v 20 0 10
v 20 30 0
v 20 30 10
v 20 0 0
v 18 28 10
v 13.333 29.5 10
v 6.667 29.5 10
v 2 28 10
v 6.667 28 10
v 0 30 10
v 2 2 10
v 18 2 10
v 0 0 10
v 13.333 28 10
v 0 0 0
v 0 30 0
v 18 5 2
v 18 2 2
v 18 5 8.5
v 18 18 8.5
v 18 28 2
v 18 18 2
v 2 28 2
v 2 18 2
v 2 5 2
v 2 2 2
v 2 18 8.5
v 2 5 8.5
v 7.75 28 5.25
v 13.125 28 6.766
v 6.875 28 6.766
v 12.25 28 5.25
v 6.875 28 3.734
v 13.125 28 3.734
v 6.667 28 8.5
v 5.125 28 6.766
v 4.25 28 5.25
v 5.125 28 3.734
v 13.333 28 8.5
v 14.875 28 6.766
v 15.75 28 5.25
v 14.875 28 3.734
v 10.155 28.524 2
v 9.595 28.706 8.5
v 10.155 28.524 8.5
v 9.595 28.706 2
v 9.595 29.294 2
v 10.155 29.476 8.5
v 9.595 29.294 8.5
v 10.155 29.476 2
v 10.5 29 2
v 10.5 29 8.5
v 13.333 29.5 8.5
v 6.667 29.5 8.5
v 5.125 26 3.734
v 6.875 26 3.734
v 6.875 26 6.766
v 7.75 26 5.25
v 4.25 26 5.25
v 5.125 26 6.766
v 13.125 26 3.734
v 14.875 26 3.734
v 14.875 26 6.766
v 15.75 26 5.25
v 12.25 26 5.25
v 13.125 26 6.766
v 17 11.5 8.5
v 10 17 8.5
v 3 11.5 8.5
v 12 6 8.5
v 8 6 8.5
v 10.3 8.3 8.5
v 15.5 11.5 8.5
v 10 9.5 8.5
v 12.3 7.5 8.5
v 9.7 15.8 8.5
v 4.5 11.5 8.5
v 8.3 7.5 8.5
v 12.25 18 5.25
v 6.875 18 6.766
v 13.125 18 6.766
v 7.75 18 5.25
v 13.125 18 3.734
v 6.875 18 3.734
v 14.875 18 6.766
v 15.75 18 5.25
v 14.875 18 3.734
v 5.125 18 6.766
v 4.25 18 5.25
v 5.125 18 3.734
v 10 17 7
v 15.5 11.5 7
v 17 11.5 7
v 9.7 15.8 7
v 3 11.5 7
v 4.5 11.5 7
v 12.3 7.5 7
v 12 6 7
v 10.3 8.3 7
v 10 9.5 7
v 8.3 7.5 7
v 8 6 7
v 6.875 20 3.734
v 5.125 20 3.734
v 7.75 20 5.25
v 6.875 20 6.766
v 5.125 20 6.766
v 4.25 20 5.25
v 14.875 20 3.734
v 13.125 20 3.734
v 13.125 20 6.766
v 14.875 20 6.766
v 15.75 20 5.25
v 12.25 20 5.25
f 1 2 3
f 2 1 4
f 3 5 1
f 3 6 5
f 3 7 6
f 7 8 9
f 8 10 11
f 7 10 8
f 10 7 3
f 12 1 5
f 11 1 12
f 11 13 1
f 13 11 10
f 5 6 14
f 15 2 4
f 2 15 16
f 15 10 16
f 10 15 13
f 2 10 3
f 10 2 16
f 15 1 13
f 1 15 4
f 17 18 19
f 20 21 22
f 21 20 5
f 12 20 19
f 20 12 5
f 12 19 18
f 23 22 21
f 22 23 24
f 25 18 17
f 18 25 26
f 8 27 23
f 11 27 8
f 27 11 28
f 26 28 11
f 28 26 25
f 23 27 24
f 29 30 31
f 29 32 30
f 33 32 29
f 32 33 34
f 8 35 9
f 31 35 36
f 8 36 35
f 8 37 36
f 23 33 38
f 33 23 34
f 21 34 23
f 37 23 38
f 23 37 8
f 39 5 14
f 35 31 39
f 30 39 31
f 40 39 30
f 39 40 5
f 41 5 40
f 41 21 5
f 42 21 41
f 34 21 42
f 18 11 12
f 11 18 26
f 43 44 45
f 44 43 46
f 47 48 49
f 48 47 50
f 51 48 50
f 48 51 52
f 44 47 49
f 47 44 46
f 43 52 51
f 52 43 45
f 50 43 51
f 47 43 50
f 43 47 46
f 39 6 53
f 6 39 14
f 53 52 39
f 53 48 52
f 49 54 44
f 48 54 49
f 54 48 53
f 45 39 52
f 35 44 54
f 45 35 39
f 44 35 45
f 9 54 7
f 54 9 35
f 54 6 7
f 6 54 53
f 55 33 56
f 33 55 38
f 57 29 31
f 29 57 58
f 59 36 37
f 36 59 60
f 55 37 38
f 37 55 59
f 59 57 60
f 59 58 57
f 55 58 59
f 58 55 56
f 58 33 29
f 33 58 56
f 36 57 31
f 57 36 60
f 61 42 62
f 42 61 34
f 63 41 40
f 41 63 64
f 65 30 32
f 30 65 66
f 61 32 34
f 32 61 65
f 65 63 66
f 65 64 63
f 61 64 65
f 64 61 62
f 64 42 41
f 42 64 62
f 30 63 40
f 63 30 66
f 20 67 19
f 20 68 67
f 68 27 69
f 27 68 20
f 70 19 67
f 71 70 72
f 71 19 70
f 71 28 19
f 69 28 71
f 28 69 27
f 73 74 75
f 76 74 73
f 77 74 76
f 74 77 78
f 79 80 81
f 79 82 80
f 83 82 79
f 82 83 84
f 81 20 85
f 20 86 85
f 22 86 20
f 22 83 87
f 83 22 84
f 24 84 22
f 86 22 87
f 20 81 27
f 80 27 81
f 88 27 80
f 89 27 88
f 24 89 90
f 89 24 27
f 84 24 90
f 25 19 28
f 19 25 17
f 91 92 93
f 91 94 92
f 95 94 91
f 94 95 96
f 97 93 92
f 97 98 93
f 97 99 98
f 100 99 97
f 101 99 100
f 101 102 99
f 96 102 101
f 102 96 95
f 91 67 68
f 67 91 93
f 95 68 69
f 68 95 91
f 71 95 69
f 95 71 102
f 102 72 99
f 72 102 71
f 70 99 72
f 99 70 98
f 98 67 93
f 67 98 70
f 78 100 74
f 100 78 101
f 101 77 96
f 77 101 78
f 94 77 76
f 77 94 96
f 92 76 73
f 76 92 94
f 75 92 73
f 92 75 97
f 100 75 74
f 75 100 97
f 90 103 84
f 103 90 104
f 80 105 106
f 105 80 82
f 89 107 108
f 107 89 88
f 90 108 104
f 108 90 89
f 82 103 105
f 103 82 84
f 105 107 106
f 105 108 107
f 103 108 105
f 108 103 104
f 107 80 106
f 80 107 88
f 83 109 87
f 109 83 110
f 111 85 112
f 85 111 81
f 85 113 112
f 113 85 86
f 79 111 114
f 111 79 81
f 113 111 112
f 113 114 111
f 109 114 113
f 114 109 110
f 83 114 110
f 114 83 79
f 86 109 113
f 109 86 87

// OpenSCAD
//thickness = 1;

// ob -> outer box
ob_thickness = 2;
ob_width = 20;
ob_length = 30;
ob_height = 12;

// lh -> latch hand
lh_thickness = 1.5;
groove_margin = 1;
groove_width = 1.5;
groove_depth = 1.5;
lh_hole_diameter=1;

module outer_box() {
    difference() {
        cube([ob_width, ob_length, ob_height-ob_thickness]);
        translate([ob_thickness, ob_thickness, ob_thickness])
            cube([ob_width-2*ob_thickness, ob_length-2*ob_thickness, ob_height]);
        translate([ob_width/2, ob_length-ob_thickness/2, ob_thickness])
            cylinder(d=lh_hole_diameter, h=ob_height);
        translate([ob_width/2, ob_length-ob_thickness/2-lh_hole_diameter/2, ob_height-ob_thickness-lh_thickness/2])
            cube([ob_width/3, ob_thickness, lh_thickness], center=true);
        
    }
    translate([mechanism_width/4+ob_thickness, ob_length-ob_thickness, mechanism_height/2+ob_thickness])
        spring_standout();

    translate([mechanism_width/4*3+ob_thickness, ob_length-ob_thickness, mechanism_height/2+ob_thickness])
        spring_standout();    
}

module outer_box_lid() {
   cube([ob_width, ob_length, ob_thickness]);
}


mechanism_length = (ob_length-2*ob_thickness)/2;
mechanism_width = ob_width-2*ob_thickness;
mechanism_height = ob_height-2*ob_thickness-lh_thickness;
mechanism_spring_radius = (mechanism_height-3)/2;
mechanism_spring_length = 2;

module spring_standout() {
    rotate(a=90, v=[1,0,0])
    cylinder(r=mechanism_spring_radius, h=mechanism_spring_length);
}

module movement_mechanism() {
    difference() {
        cube([mechanism_width, mechanism_length, mechanism_height]);
        translate([0,0,mechanism_height-groove_depth])
            latch_grove();
    }
    translate([mechanism_width/4, mechanism_length+mechanism_spring_length, mechanism_height/2])
    spring_standout();

    translate([mechanism_width/4*3, mechanism_length+mechanism_spring_length, mechanism_height/2])
    spring_standout();
}

//  2 1
// / 3  \
//4     6
// \   /
//   5
groove_bottom_offset=.3;
groove_top_notch_size = 2;
groove_top_notch_offset = .3;
module latch_grove() {    
    GrovePoints = [
        [mechanism_width/2-groove_top_notch_size, groove_margin], 
        [mechanism_width/2+groove_top_notch_size, groove_margin], 
        [mechanism_width/2+groove_top_notch_offset, groove_margin+groove_top_notch_size+groove_top_notch_offset], 
        [mechanism_width-groove_margin, mechanism_length/2],
        [mechanism_width/2, mechanism_length-groove_margin], 
        [groove_margin, mechanism_length/2],

        [mechanism_width/2-groove_top_notch_size+groove_top_notch_offset, groove_margin+groove_width], 
        [mechanism_width/2+groove_top_notch_size+groove_top_notch_offset, groove_margin+groove_width], 
        [mechanism_width/2, groove_margin+groove_top_notch_size+groove_width], 
        [mechanism_width-groove_margin-groove_width, mechanism_length/2],
        [mechanism_width/2-groove_bottom_offset, mechanism_length-groove_margin-groove_width+groove_bottom_offset], 
        [groove_margin+groove_width, mechanism_length/2],

    ];
    GrovePaths = [
        [0,2,1,3,4,5],
        [6,8,7,9,10,11],
    ];  
    linear_extrude(groove_depth)
        polygon(GrovePoints, GrovePaths);
}

module assembly() {
    outer_box();
    translate([0,0,ob_height-ob_thickness])
%        outer_box_lid();
    translate([ob_thickness, ob_thickness+ob_length/10, ob_thickness])
        movement_mechanism();
}

//outer_box();
//outer_box_lid();
//movement_mechanism();

assembly();
